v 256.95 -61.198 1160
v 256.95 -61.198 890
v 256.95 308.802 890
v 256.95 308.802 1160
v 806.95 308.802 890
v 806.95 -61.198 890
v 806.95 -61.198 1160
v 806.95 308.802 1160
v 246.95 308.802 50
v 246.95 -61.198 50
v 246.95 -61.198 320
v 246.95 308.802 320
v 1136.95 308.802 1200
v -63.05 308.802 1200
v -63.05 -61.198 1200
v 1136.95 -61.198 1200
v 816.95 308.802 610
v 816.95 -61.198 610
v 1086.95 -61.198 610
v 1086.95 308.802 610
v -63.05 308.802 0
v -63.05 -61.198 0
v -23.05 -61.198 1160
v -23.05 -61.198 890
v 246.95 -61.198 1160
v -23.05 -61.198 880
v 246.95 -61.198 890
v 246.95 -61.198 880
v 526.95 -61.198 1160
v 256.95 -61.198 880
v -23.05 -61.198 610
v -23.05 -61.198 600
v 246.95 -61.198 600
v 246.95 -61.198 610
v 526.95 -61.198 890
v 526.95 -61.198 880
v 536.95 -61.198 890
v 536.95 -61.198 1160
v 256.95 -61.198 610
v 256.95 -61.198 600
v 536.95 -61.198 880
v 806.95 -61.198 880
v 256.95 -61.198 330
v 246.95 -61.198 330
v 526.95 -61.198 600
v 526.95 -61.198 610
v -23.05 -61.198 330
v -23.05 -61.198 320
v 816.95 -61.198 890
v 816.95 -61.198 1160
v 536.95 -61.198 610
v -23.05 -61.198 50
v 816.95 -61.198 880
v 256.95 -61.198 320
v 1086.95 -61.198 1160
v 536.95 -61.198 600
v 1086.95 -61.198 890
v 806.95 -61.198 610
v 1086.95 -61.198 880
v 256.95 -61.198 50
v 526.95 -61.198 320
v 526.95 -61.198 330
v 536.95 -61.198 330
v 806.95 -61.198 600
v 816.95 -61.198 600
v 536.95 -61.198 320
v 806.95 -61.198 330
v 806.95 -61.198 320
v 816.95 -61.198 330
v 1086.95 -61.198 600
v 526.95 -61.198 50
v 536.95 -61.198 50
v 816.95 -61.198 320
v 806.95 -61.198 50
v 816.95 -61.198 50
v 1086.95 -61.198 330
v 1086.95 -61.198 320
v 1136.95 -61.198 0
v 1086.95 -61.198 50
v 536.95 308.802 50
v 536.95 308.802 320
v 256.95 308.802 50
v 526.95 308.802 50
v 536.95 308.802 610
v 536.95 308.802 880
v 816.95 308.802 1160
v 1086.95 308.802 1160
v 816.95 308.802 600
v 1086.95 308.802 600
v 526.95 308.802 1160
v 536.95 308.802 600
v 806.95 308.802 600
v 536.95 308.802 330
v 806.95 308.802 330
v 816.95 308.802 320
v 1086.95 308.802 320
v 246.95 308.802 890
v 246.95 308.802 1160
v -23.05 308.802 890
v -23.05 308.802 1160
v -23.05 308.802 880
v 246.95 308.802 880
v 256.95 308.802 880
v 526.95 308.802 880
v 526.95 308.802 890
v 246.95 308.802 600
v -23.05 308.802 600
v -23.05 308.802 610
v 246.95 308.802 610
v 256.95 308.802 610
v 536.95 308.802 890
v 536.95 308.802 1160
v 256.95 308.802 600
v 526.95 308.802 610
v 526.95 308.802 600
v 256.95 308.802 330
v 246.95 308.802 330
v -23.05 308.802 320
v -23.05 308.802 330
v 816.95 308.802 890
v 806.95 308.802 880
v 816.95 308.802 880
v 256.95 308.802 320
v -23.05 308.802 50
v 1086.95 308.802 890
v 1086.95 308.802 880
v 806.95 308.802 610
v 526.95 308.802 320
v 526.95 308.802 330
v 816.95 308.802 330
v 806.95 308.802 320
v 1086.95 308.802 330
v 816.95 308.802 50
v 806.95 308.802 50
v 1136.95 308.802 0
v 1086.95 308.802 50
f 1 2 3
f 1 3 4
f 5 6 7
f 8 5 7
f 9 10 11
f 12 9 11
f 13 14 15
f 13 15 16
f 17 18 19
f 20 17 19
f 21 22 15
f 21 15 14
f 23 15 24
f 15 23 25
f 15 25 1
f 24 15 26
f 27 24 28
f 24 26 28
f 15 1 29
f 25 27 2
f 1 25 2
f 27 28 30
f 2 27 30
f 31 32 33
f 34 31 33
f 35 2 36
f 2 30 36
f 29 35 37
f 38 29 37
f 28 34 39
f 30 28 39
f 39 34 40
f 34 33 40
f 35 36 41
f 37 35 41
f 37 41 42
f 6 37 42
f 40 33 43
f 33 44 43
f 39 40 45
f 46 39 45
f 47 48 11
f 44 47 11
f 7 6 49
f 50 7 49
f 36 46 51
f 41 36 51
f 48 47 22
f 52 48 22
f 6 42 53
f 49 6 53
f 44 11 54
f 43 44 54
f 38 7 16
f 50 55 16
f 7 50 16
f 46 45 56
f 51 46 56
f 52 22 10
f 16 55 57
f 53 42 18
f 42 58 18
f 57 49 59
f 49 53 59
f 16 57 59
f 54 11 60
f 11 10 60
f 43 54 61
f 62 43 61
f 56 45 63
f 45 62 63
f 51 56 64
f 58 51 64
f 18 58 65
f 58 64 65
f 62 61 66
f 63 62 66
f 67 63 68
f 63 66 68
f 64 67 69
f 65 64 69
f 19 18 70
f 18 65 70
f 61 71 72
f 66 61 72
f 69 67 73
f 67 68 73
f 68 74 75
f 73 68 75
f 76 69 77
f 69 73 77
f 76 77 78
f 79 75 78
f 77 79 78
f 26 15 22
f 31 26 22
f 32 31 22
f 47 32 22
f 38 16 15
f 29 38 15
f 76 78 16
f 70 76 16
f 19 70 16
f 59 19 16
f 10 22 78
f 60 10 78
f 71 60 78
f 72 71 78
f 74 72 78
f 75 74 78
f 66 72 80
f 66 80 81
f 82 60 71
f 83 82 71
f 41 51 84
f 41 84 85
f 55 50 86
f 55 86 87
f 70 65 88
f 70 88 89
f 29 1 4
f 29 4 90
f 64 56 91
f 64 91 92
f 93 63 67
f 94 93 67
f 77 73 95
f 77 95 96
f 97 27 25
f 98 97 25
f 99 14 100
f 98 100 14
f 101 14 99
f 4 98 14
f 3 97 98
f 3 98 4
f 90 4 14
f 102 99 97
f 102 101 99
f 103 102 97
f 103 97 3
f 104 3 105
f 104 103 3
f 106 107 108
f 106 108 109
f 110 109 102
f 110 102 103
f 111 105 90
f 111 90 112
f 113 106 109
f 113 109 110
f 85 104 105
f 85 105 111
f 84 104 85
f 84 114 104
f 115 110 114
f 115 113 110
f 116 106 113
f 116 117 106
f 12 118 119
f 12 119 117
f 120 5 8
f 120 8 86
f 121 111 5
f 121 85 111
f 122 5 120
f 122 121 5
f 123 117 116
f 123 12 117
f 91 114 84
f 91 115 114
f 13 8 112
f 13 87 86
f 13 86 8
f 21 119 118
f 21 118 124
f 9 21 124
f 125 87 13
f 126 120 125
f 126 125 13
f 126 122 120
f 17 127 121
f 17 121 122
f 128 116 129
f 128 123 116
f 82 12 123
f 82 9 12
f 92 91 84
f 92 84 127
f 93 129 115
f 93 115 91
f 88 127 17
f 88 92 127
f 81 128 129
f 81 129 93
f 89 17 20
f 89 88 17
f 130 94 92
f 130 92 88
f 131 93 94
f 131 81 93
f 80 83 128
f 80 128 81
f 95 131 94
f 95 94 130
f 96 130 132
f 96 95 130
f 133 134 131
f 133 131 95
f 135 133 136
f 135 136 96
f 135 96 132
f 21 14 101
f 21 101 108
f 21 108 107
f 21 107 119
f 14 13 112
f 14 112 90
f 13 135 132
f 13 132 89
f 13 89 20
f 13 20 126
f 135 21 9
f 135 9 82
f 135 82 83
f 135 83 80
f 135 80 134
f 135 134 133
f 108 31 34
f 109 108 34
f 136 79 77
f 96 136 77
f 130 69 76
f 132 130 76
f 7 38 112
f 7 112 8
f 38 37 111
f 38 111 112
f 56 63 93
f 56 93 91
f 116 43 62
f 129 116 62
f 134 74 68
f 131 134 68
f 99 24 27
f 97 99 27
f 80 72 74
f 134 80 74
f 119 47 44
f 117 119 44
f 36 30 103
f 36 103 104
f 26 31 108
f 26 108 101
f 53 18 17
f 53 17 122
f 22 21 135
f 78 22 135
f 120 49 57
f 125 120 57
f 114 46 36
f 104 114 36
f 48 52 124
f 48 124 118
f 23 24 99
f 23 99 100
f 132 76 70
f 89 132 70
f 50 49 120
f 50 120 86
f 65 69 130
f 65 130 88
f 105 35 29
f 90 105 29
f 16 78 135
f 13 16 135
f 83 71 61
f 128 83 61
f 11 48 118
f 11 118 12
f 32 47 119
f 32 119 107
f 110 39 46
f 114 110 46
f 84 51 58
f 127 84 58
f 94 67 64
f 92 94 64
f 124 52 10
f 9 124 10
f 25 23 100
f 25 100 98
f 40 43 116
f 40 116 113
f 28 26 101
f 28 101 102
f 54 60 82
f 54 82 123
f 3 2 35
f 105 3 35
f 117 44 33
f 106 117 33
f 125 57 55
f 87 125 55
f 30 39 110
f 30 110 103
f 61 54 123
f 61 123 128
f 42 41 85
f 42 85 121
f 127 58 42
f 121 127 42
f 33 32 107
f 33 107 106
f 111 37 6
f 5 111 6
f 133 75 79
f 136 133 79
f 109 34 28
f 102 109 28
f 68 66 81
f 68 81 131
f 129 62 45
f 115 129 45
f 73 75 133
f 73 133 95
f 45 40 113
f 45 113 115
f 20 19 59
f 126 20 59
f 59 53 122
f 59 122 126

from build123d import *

# Parameters (mm, degrees)
F0_W     = 1200
F0_H     = 370
F1_DEPTH = 1200
F2_W     = 270
F2_H     = 270
F3_DEPTH = 370.001


with BuildPart() as f1:
    # F0 (on Top) → F1 (new body)
    with BuildSketch(Plane.XY):
        with Locations((536.95002, 123.801892)):
            Rectangle(F0_W, F0_H)
    extrude(amount=F1_DEPTH)

    # F2 (on face) → F3 (cut, through all)
    with BuildSketch(Plane.XZ.offset(61.198108)):
        with Locations((111.95002, 1025)):
            Rectangle(F2_W, F2_H)
        with Locations((391.95002, 1025)):
            Rectangle(F2_W, F2_H)
        with Locations((671.95002, 1025)):
            Rectangle(F2_W, F2_H)
        with Locations((951.95002, 1025)):
            Rectangle(F2_W, F2_H)
        with Locations((951.95002, 745)):
            Rectangle(F2_W, F2_H)
        with Locations((671.95002, 745)):
            Rectangle(F2_W, F2_H)
        with Locations((391.95002, 745)):
            Rectangle(F2_W, F2_H)
        with Locations((111.95002, 745)):
            Rectangle(F2_W, F2_H)
        with Locations((111.95002, 465)):
            Rectangle(F2_W, F2_H)
        with Locations((391.95002, 465)):
            Rectangle(F2_W, F2_H)
        with Locations((671.95002, 465)):
            Rectangle(F2_W, F2_H)
        with Locations((951.95002, 465)):
            Rectangle(F2_W, F2_H)
        with Locations((951.95002, 185)):
            Rectangle(F2_W, F2_H)
        with Locations((671.95002, 185)):
            Rectangle(F2_W, F2_H)
        with Locations((391.95002, 185)):
            Rectangle(F2_W, F2_H)
        with Locations((111.95002, 185)):
            Rectangle(F2_W, F2_H)
    extrude(amount=-F3_DEPTH, mode=Mode.SUBTRACT)


solid = f1.part
